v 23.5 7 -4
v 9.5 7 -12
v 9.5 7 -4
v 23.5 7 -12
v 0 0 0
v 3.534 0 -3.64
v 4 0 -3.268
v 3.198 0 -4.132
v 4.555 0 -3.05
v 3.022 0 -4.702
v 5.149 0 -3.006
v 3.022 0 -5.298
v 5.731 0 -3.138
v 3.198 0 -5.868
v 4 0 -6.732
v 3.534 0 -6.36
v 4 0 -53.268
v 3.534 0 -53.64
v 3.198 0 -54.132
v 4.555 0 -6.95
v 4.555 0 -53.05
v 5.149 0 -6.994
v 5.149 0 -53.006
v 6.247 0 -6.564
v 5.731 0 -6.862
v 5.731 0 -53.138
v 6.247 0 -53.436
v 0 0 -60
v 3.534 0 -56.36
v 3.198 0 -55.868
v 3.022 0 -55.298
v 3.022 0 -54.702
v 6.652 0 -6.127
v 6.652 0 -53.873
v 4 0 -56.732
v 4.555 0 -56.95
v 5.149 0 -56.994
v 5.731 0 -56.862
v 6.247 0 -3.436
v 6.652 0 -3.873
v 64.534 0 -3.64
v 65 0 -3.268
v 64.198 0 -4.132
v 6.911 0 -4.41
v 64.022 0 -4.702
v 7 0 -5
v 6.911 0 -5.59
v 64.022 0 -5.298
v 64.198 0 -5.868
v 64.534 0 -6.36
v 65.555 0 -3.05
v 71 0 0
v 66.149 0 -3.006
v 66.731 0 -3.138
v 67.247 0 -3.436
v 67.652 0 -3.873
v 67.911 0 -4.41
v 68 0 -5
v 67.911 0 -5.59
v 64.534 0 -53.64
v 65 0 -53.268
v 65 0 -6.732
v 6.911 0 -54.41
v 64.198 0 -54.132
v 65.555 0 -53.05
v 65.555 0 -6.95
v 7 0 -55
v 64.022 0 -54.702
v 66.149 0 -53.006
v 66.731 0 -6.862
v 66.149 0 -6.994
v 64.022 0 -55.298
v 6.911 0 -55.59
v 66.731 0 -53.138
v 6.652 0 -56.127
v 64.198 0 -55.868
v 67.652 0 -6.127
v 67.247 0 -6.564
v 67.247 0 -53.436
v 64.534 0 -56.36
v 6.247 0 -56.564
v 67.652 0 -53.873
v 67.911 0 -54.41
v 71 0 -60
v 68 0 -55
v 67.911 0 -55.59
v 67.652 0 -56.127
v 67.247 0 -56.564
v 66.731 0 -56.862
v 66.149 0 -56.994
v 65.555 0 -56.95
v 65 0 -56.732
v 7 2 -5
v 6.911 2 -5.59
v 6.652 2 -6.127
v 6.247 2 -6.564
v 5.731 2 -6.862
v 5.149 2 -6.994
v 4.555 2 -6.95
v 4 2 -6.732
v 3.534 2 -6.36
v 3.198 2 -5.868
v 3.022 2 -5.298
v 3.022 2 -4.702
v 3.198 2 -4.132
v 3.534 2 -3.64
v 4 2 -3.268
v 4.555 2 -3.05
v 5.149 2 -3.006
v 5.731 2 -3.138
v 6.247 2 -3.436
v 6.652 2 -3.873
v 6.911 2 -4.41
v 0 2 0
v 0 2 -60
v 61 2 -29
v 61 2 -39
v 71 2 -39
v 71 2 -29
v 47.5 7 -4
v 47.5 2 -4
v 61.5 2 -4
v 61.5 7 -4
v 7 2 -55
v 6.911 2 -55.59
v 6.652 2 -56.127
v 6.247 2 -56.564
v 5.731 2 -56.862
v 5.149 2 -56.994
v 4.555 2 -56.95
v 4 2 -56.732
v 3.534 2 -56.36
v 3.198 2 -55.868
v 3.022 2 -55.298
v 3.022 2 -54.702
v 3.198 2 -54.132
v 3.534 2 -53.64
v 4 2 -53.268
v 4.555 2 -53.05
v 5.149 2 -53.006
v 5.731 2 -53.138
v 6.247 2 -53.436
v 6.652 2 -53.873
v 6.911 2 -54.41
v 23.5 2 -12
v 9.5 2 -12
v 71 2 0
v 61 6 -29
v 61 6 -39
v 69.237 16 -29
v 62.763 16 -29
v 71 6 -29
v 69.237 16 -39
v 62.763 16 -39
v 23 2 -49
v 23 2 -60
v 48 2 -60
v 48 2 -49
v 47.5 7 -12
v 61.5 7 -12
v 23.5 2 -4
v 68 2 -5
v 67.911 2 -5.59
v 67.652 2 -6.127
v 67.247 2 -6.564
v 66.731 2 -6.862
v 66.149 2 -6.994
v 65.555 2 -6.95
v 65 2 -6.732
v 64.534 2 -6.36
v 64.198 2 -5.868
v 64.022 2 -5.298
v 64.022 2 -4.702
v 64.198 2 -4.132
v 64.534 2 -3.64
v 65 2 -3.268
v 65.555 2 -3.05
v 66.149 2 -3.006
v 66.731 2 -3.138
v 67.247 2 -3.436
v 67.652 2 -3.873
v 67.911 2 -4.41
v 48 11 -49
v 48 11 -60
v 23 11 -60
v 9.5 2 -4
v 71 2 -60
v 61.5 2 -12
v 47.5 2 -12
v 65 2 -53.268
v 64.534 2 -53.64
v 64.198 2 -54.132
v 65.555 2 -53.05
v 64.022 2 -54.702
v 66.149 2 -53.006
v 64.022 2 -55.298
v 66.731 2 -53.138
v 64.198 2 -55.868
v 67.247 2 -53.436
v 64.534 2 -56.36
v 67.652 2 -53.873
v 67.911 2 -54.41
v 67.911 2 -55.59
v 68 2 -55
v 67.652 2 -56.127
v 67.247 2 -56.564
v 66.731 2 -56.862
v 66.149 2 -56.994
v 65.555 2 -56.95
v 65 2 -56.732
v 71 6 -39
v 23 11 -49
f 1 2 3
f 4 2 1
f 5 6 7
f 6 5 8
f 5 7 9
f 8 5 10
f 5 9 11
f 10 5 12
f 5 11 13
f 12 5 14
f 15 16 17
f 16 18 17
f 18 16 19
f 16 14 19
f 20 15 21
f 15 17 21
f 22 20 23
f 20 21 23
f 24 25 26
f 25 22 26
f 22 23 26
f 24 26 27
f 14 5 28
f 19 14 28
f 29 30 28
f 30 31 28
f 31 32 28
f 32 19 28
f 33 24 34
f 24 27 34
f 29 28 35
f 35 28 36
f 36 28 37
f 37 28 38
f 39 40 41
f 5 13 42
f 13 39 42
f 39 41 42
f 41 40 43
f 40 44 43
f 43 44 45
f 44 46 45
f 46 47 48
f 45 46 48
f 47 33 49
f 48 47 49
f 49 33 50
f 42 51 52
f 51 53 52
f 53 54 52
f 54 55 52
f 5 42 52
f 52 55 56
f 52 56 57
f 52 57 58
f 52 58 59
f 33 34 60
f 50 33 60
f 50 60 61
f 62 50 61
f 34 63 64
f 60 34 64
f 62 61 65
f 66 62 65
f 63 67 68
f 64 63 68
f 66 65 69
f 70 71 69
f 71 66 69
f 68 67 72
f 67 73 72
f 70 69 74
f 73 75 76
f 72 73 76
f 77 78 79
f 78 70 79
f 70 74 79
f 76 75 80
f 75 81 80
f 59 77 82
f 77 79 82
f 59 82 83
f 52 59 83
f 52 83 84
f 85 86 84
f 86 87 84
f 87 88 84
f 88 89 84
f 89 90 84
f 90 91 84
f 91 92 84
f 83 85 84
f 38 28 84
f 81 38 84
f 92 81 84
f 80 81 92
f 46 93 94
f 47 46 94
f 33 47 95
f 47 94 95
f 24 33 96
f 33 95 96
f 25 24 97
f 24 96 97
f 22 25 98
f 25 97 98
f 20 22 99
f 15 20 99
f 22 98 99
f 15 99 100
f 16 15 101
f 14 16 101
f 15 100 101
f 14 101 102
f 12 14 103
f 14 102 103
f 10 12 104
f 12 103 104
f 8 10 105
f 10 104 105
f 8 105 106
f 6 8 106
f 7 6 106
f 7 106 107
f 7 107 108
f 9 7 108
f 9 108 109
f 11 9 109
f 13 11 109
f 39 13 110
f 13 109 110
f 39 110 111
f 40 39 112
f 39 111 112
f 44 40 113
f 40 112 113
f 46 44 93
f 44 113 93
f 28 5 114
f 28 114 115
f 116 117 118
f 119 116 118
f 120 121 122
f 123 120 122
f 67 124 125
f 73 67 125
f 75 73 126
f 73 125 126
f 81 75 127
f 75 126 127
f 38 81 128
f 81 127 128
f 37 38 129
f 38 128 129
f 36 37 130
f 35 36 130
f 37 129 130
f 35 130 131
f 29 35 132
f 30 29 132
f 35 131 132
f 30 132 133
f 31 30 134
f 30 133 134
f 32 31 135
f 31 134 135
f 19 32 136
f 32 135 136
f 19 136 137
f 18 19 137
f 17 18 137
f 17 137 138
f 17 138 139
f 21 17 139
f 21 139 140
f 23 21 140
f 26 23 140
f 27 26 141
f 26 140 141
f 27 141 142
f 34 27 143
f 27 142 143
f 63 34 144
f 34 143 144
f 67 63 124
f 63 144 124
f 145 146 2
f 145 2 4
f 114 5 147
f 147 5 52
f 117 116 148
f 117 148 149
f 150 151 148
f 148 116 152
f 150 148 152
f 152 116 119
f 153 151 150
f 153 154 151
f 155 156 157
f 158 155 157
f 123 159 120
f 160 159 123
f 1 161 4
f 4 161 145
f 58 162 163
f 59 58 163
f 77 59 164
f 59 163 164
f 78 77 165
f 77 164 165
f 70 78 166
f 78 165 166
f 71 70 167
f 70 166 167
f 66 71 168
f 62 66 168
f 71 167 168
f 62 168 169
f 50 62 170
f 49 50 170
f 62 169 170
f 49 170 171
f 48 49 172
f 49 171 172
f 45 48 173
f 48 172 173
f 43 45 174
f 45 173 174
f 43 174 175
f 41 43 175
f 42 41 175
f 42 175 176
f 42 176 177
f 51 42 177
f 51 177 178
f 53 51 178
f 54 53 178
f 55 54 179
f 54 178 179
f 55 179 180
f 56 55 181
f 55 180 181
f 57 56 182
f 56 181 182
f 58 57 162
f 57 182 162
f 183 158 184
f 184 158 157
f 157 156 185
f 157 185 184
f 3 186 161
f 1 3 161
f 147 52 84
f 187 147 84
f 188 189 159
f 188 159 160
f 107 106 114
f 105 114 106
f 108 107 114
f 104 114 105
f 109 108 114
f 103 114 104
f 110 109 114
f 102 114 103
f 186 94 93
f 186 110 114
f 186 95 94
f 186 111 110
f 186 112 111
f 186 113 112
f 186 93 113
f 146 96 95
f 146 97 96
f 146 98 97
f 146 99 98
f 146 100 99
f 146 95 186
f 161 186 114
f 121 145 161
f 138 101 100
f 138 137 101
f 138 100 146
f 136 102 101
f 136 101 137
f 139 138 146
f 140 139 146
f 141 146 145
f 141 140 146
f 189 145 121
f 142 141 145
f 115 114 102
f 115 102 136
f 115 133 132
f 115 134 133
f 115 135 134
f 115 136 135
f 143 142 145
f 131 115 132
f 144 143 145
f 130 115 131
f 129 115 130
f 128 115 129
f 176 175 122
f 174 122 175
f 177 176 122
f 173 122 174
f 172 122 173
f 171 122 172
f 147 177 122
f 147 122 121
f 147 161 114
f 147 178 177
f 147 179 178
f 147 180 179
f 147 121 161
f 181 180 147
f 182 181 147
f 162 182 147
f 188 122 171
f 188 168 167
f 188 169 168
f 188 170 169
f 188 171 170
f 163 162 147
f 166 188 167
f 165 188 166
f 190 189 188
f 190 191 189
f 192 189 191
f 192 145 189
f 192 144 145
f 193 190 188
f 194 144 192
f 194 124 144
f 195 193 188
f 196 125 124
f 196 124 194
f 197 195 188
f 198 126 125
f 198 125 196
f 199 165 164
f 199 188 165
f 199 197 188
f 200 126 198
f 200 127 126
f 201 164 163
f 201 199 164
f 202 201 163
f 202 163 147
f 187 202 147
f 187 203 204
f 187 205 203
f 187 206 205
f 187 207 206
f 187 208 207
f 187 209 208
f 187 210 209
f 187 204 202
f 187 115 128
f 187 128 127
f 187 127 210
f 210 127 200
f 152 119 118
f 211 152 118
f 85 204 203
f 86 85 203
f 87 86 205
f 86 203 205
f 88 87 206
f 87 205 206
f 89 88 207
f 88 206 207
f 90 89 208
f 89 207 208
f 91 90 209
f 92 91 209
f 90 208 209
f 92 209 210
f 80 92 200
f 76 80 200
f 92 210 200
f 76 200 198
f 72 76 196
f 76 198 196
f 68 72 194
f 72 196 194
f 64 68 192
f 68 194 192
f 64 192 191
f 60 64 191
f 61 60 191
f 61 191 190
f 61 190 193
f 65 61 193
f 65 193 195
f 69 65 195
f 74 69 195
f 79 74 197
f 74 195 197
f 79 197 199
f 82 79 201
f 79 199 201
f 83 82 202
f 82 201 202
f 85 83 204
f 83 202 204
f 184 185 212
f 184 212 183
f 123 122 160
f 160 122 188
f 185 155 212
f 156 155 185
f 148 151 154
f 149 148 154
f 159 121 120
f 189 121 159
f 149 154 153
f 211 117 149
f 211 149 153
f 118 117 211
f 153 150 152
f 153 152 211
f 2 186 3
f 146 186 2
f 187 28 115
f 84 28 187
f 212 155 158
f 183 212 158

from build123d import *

# Parameters (mm, degrees)
SKETCH1_W             = 71
SKETCH1_H             = 60
BOSS_EXTRUDE1_DEPTH   = 2
SKETCH2_W             = 25
SKETCH2_H             = 11
BOSS_EXTRUDE2_DEPTH   = 9
SKETCH2_3_W           = 10
SKETCH2_3_H           = 10
BOSS_EXTRUDE3_DEPTH   = 14
CHAMFER1_SIZE         = 10
CHAMFER1_SIZE2        = 1.763269807
CHAMFER1_PART_2_SIZE  = 10
CHAMFER1_PART_2_SIZE2 = 1.763269807
SKETCH2_5_R           = 2
CUT_EXTRUDE2_DEPTH    = 2
SKETCH2_6_W           = 14
SKETCH2_6_H           = 8
BOSS_EXTRUDE4_DEPTH   = 5


with BuildPart() as part:
    # Sketch1 → Boss-Extrude1 (new body)
    with BuildSketch(Plane(origin=(0, 0, 0), x_dir=(1, 0, 0), z_dir=(0, 1, 0))):
        with Locations((35.5, 30)):
            Rectangle(SKETCH1_W, SKETCH1_H)
    extrude(amount=BOSS_EXTRUDE1_DEPTH)

    # Sketch2<5> → Cut-Extrude2 (cut)
    with BuildSketch(Plane(origin=(0, 2, 0), x_dir=(1, 0, 0), z_dir=(0, 1, 0))):
        with Locations((5, 55)):
            Circle(SKETCH2_5_R)
        with Locations((5, 5)):
            Circle(SKETCH2_5_R)
        with Locations((66, 5)):
            Circle(SKETCH2_5_R)
        with Locations((66, 55)):
            Circle(SKETCH2_5_R)
    extrude(amount=-CUT_EXTRUDE2_DEPTH, mode=Mode.SUBTRACT)

    # Sketch2<6> → Boss-Extrude4 (add)
    with BuildSketch(Plane(origin=(0, 2, 0), x_dir=(1, 0, 0), z_dir=(0, 1, 0))):
        with Locations((16.5, 8)):
            Rectangle(SKETCH2_6_W, SKETCH2_6_H)
        with Locations((54.5, 8)):
            Rectangle(SKETCH2_6_W, SKETCH2_6_H)
    extrude(amount=BOSS_EXTRUDE4_DEPTH)


with BuildPart() as body_2:
    # Sketch2 → Boss-Extrude2 (new body)
    with BuildSketch(Plane(origin=(0, 2, 0), x_dir=(1, 0, 0), z_dir=(0, 1, 0))):
        with Locations((35.5, 54.5)):
            Rectangle(SKETCH2_W, SKETCH2_H)
    extrude(amount=BOSS_EXTRUDE2_DEPTH)


with BuildPart() as body_3:
    # Sketch2<3> → Boss-Extrude3 (new body)
    with BuildSketch(Plane(origin=(0, 2, 0), x_dir=(1, 0, 0), z_dir=(0, 1, 0))):
        with Locations((66, 34)):
            Rectangle(SKETCH2_3_W, SKETCH2_3_H)
    extrude(amount=BOSS_EXTRUDE3_DEPTH)

    # Chamfer1
    chamfer1_edges = [body_3.edges().sort_by_distance(p)[0] for p in [
        (71, 16, -34),
    ]]
    chamfer1_side = [body_3.faces().sort_by_distance(p)[0] for p in [
        (71, 9, -34),
    ]]
    chamfer(chamfer1_edges, length=CHAMFER1_SIZE, length2=CHAMFER1_SIZE2, reference=chamfer1_side[0])

    # Chamfer1 part 2
    chamfer1_part_2_edges = [body_3.edges().sort_by_distance(p)[0] for p in [
        (61, 16, -34),
    ]]
    chamfer1_part_2_side = [body_3.faces().sort_by_distance(p)[0] for p in [
        (61, 9, -34),
    ]]
    chamfer(chamfer1_part_2_edges, length=CHAMFER1_PART_2_SIZE, length2=CHAMFER1_PART_2_SIZE2, reference=chamfer1_part_2_side[0])


solid = Compound([part.part, body_2.part, body_3.part])
